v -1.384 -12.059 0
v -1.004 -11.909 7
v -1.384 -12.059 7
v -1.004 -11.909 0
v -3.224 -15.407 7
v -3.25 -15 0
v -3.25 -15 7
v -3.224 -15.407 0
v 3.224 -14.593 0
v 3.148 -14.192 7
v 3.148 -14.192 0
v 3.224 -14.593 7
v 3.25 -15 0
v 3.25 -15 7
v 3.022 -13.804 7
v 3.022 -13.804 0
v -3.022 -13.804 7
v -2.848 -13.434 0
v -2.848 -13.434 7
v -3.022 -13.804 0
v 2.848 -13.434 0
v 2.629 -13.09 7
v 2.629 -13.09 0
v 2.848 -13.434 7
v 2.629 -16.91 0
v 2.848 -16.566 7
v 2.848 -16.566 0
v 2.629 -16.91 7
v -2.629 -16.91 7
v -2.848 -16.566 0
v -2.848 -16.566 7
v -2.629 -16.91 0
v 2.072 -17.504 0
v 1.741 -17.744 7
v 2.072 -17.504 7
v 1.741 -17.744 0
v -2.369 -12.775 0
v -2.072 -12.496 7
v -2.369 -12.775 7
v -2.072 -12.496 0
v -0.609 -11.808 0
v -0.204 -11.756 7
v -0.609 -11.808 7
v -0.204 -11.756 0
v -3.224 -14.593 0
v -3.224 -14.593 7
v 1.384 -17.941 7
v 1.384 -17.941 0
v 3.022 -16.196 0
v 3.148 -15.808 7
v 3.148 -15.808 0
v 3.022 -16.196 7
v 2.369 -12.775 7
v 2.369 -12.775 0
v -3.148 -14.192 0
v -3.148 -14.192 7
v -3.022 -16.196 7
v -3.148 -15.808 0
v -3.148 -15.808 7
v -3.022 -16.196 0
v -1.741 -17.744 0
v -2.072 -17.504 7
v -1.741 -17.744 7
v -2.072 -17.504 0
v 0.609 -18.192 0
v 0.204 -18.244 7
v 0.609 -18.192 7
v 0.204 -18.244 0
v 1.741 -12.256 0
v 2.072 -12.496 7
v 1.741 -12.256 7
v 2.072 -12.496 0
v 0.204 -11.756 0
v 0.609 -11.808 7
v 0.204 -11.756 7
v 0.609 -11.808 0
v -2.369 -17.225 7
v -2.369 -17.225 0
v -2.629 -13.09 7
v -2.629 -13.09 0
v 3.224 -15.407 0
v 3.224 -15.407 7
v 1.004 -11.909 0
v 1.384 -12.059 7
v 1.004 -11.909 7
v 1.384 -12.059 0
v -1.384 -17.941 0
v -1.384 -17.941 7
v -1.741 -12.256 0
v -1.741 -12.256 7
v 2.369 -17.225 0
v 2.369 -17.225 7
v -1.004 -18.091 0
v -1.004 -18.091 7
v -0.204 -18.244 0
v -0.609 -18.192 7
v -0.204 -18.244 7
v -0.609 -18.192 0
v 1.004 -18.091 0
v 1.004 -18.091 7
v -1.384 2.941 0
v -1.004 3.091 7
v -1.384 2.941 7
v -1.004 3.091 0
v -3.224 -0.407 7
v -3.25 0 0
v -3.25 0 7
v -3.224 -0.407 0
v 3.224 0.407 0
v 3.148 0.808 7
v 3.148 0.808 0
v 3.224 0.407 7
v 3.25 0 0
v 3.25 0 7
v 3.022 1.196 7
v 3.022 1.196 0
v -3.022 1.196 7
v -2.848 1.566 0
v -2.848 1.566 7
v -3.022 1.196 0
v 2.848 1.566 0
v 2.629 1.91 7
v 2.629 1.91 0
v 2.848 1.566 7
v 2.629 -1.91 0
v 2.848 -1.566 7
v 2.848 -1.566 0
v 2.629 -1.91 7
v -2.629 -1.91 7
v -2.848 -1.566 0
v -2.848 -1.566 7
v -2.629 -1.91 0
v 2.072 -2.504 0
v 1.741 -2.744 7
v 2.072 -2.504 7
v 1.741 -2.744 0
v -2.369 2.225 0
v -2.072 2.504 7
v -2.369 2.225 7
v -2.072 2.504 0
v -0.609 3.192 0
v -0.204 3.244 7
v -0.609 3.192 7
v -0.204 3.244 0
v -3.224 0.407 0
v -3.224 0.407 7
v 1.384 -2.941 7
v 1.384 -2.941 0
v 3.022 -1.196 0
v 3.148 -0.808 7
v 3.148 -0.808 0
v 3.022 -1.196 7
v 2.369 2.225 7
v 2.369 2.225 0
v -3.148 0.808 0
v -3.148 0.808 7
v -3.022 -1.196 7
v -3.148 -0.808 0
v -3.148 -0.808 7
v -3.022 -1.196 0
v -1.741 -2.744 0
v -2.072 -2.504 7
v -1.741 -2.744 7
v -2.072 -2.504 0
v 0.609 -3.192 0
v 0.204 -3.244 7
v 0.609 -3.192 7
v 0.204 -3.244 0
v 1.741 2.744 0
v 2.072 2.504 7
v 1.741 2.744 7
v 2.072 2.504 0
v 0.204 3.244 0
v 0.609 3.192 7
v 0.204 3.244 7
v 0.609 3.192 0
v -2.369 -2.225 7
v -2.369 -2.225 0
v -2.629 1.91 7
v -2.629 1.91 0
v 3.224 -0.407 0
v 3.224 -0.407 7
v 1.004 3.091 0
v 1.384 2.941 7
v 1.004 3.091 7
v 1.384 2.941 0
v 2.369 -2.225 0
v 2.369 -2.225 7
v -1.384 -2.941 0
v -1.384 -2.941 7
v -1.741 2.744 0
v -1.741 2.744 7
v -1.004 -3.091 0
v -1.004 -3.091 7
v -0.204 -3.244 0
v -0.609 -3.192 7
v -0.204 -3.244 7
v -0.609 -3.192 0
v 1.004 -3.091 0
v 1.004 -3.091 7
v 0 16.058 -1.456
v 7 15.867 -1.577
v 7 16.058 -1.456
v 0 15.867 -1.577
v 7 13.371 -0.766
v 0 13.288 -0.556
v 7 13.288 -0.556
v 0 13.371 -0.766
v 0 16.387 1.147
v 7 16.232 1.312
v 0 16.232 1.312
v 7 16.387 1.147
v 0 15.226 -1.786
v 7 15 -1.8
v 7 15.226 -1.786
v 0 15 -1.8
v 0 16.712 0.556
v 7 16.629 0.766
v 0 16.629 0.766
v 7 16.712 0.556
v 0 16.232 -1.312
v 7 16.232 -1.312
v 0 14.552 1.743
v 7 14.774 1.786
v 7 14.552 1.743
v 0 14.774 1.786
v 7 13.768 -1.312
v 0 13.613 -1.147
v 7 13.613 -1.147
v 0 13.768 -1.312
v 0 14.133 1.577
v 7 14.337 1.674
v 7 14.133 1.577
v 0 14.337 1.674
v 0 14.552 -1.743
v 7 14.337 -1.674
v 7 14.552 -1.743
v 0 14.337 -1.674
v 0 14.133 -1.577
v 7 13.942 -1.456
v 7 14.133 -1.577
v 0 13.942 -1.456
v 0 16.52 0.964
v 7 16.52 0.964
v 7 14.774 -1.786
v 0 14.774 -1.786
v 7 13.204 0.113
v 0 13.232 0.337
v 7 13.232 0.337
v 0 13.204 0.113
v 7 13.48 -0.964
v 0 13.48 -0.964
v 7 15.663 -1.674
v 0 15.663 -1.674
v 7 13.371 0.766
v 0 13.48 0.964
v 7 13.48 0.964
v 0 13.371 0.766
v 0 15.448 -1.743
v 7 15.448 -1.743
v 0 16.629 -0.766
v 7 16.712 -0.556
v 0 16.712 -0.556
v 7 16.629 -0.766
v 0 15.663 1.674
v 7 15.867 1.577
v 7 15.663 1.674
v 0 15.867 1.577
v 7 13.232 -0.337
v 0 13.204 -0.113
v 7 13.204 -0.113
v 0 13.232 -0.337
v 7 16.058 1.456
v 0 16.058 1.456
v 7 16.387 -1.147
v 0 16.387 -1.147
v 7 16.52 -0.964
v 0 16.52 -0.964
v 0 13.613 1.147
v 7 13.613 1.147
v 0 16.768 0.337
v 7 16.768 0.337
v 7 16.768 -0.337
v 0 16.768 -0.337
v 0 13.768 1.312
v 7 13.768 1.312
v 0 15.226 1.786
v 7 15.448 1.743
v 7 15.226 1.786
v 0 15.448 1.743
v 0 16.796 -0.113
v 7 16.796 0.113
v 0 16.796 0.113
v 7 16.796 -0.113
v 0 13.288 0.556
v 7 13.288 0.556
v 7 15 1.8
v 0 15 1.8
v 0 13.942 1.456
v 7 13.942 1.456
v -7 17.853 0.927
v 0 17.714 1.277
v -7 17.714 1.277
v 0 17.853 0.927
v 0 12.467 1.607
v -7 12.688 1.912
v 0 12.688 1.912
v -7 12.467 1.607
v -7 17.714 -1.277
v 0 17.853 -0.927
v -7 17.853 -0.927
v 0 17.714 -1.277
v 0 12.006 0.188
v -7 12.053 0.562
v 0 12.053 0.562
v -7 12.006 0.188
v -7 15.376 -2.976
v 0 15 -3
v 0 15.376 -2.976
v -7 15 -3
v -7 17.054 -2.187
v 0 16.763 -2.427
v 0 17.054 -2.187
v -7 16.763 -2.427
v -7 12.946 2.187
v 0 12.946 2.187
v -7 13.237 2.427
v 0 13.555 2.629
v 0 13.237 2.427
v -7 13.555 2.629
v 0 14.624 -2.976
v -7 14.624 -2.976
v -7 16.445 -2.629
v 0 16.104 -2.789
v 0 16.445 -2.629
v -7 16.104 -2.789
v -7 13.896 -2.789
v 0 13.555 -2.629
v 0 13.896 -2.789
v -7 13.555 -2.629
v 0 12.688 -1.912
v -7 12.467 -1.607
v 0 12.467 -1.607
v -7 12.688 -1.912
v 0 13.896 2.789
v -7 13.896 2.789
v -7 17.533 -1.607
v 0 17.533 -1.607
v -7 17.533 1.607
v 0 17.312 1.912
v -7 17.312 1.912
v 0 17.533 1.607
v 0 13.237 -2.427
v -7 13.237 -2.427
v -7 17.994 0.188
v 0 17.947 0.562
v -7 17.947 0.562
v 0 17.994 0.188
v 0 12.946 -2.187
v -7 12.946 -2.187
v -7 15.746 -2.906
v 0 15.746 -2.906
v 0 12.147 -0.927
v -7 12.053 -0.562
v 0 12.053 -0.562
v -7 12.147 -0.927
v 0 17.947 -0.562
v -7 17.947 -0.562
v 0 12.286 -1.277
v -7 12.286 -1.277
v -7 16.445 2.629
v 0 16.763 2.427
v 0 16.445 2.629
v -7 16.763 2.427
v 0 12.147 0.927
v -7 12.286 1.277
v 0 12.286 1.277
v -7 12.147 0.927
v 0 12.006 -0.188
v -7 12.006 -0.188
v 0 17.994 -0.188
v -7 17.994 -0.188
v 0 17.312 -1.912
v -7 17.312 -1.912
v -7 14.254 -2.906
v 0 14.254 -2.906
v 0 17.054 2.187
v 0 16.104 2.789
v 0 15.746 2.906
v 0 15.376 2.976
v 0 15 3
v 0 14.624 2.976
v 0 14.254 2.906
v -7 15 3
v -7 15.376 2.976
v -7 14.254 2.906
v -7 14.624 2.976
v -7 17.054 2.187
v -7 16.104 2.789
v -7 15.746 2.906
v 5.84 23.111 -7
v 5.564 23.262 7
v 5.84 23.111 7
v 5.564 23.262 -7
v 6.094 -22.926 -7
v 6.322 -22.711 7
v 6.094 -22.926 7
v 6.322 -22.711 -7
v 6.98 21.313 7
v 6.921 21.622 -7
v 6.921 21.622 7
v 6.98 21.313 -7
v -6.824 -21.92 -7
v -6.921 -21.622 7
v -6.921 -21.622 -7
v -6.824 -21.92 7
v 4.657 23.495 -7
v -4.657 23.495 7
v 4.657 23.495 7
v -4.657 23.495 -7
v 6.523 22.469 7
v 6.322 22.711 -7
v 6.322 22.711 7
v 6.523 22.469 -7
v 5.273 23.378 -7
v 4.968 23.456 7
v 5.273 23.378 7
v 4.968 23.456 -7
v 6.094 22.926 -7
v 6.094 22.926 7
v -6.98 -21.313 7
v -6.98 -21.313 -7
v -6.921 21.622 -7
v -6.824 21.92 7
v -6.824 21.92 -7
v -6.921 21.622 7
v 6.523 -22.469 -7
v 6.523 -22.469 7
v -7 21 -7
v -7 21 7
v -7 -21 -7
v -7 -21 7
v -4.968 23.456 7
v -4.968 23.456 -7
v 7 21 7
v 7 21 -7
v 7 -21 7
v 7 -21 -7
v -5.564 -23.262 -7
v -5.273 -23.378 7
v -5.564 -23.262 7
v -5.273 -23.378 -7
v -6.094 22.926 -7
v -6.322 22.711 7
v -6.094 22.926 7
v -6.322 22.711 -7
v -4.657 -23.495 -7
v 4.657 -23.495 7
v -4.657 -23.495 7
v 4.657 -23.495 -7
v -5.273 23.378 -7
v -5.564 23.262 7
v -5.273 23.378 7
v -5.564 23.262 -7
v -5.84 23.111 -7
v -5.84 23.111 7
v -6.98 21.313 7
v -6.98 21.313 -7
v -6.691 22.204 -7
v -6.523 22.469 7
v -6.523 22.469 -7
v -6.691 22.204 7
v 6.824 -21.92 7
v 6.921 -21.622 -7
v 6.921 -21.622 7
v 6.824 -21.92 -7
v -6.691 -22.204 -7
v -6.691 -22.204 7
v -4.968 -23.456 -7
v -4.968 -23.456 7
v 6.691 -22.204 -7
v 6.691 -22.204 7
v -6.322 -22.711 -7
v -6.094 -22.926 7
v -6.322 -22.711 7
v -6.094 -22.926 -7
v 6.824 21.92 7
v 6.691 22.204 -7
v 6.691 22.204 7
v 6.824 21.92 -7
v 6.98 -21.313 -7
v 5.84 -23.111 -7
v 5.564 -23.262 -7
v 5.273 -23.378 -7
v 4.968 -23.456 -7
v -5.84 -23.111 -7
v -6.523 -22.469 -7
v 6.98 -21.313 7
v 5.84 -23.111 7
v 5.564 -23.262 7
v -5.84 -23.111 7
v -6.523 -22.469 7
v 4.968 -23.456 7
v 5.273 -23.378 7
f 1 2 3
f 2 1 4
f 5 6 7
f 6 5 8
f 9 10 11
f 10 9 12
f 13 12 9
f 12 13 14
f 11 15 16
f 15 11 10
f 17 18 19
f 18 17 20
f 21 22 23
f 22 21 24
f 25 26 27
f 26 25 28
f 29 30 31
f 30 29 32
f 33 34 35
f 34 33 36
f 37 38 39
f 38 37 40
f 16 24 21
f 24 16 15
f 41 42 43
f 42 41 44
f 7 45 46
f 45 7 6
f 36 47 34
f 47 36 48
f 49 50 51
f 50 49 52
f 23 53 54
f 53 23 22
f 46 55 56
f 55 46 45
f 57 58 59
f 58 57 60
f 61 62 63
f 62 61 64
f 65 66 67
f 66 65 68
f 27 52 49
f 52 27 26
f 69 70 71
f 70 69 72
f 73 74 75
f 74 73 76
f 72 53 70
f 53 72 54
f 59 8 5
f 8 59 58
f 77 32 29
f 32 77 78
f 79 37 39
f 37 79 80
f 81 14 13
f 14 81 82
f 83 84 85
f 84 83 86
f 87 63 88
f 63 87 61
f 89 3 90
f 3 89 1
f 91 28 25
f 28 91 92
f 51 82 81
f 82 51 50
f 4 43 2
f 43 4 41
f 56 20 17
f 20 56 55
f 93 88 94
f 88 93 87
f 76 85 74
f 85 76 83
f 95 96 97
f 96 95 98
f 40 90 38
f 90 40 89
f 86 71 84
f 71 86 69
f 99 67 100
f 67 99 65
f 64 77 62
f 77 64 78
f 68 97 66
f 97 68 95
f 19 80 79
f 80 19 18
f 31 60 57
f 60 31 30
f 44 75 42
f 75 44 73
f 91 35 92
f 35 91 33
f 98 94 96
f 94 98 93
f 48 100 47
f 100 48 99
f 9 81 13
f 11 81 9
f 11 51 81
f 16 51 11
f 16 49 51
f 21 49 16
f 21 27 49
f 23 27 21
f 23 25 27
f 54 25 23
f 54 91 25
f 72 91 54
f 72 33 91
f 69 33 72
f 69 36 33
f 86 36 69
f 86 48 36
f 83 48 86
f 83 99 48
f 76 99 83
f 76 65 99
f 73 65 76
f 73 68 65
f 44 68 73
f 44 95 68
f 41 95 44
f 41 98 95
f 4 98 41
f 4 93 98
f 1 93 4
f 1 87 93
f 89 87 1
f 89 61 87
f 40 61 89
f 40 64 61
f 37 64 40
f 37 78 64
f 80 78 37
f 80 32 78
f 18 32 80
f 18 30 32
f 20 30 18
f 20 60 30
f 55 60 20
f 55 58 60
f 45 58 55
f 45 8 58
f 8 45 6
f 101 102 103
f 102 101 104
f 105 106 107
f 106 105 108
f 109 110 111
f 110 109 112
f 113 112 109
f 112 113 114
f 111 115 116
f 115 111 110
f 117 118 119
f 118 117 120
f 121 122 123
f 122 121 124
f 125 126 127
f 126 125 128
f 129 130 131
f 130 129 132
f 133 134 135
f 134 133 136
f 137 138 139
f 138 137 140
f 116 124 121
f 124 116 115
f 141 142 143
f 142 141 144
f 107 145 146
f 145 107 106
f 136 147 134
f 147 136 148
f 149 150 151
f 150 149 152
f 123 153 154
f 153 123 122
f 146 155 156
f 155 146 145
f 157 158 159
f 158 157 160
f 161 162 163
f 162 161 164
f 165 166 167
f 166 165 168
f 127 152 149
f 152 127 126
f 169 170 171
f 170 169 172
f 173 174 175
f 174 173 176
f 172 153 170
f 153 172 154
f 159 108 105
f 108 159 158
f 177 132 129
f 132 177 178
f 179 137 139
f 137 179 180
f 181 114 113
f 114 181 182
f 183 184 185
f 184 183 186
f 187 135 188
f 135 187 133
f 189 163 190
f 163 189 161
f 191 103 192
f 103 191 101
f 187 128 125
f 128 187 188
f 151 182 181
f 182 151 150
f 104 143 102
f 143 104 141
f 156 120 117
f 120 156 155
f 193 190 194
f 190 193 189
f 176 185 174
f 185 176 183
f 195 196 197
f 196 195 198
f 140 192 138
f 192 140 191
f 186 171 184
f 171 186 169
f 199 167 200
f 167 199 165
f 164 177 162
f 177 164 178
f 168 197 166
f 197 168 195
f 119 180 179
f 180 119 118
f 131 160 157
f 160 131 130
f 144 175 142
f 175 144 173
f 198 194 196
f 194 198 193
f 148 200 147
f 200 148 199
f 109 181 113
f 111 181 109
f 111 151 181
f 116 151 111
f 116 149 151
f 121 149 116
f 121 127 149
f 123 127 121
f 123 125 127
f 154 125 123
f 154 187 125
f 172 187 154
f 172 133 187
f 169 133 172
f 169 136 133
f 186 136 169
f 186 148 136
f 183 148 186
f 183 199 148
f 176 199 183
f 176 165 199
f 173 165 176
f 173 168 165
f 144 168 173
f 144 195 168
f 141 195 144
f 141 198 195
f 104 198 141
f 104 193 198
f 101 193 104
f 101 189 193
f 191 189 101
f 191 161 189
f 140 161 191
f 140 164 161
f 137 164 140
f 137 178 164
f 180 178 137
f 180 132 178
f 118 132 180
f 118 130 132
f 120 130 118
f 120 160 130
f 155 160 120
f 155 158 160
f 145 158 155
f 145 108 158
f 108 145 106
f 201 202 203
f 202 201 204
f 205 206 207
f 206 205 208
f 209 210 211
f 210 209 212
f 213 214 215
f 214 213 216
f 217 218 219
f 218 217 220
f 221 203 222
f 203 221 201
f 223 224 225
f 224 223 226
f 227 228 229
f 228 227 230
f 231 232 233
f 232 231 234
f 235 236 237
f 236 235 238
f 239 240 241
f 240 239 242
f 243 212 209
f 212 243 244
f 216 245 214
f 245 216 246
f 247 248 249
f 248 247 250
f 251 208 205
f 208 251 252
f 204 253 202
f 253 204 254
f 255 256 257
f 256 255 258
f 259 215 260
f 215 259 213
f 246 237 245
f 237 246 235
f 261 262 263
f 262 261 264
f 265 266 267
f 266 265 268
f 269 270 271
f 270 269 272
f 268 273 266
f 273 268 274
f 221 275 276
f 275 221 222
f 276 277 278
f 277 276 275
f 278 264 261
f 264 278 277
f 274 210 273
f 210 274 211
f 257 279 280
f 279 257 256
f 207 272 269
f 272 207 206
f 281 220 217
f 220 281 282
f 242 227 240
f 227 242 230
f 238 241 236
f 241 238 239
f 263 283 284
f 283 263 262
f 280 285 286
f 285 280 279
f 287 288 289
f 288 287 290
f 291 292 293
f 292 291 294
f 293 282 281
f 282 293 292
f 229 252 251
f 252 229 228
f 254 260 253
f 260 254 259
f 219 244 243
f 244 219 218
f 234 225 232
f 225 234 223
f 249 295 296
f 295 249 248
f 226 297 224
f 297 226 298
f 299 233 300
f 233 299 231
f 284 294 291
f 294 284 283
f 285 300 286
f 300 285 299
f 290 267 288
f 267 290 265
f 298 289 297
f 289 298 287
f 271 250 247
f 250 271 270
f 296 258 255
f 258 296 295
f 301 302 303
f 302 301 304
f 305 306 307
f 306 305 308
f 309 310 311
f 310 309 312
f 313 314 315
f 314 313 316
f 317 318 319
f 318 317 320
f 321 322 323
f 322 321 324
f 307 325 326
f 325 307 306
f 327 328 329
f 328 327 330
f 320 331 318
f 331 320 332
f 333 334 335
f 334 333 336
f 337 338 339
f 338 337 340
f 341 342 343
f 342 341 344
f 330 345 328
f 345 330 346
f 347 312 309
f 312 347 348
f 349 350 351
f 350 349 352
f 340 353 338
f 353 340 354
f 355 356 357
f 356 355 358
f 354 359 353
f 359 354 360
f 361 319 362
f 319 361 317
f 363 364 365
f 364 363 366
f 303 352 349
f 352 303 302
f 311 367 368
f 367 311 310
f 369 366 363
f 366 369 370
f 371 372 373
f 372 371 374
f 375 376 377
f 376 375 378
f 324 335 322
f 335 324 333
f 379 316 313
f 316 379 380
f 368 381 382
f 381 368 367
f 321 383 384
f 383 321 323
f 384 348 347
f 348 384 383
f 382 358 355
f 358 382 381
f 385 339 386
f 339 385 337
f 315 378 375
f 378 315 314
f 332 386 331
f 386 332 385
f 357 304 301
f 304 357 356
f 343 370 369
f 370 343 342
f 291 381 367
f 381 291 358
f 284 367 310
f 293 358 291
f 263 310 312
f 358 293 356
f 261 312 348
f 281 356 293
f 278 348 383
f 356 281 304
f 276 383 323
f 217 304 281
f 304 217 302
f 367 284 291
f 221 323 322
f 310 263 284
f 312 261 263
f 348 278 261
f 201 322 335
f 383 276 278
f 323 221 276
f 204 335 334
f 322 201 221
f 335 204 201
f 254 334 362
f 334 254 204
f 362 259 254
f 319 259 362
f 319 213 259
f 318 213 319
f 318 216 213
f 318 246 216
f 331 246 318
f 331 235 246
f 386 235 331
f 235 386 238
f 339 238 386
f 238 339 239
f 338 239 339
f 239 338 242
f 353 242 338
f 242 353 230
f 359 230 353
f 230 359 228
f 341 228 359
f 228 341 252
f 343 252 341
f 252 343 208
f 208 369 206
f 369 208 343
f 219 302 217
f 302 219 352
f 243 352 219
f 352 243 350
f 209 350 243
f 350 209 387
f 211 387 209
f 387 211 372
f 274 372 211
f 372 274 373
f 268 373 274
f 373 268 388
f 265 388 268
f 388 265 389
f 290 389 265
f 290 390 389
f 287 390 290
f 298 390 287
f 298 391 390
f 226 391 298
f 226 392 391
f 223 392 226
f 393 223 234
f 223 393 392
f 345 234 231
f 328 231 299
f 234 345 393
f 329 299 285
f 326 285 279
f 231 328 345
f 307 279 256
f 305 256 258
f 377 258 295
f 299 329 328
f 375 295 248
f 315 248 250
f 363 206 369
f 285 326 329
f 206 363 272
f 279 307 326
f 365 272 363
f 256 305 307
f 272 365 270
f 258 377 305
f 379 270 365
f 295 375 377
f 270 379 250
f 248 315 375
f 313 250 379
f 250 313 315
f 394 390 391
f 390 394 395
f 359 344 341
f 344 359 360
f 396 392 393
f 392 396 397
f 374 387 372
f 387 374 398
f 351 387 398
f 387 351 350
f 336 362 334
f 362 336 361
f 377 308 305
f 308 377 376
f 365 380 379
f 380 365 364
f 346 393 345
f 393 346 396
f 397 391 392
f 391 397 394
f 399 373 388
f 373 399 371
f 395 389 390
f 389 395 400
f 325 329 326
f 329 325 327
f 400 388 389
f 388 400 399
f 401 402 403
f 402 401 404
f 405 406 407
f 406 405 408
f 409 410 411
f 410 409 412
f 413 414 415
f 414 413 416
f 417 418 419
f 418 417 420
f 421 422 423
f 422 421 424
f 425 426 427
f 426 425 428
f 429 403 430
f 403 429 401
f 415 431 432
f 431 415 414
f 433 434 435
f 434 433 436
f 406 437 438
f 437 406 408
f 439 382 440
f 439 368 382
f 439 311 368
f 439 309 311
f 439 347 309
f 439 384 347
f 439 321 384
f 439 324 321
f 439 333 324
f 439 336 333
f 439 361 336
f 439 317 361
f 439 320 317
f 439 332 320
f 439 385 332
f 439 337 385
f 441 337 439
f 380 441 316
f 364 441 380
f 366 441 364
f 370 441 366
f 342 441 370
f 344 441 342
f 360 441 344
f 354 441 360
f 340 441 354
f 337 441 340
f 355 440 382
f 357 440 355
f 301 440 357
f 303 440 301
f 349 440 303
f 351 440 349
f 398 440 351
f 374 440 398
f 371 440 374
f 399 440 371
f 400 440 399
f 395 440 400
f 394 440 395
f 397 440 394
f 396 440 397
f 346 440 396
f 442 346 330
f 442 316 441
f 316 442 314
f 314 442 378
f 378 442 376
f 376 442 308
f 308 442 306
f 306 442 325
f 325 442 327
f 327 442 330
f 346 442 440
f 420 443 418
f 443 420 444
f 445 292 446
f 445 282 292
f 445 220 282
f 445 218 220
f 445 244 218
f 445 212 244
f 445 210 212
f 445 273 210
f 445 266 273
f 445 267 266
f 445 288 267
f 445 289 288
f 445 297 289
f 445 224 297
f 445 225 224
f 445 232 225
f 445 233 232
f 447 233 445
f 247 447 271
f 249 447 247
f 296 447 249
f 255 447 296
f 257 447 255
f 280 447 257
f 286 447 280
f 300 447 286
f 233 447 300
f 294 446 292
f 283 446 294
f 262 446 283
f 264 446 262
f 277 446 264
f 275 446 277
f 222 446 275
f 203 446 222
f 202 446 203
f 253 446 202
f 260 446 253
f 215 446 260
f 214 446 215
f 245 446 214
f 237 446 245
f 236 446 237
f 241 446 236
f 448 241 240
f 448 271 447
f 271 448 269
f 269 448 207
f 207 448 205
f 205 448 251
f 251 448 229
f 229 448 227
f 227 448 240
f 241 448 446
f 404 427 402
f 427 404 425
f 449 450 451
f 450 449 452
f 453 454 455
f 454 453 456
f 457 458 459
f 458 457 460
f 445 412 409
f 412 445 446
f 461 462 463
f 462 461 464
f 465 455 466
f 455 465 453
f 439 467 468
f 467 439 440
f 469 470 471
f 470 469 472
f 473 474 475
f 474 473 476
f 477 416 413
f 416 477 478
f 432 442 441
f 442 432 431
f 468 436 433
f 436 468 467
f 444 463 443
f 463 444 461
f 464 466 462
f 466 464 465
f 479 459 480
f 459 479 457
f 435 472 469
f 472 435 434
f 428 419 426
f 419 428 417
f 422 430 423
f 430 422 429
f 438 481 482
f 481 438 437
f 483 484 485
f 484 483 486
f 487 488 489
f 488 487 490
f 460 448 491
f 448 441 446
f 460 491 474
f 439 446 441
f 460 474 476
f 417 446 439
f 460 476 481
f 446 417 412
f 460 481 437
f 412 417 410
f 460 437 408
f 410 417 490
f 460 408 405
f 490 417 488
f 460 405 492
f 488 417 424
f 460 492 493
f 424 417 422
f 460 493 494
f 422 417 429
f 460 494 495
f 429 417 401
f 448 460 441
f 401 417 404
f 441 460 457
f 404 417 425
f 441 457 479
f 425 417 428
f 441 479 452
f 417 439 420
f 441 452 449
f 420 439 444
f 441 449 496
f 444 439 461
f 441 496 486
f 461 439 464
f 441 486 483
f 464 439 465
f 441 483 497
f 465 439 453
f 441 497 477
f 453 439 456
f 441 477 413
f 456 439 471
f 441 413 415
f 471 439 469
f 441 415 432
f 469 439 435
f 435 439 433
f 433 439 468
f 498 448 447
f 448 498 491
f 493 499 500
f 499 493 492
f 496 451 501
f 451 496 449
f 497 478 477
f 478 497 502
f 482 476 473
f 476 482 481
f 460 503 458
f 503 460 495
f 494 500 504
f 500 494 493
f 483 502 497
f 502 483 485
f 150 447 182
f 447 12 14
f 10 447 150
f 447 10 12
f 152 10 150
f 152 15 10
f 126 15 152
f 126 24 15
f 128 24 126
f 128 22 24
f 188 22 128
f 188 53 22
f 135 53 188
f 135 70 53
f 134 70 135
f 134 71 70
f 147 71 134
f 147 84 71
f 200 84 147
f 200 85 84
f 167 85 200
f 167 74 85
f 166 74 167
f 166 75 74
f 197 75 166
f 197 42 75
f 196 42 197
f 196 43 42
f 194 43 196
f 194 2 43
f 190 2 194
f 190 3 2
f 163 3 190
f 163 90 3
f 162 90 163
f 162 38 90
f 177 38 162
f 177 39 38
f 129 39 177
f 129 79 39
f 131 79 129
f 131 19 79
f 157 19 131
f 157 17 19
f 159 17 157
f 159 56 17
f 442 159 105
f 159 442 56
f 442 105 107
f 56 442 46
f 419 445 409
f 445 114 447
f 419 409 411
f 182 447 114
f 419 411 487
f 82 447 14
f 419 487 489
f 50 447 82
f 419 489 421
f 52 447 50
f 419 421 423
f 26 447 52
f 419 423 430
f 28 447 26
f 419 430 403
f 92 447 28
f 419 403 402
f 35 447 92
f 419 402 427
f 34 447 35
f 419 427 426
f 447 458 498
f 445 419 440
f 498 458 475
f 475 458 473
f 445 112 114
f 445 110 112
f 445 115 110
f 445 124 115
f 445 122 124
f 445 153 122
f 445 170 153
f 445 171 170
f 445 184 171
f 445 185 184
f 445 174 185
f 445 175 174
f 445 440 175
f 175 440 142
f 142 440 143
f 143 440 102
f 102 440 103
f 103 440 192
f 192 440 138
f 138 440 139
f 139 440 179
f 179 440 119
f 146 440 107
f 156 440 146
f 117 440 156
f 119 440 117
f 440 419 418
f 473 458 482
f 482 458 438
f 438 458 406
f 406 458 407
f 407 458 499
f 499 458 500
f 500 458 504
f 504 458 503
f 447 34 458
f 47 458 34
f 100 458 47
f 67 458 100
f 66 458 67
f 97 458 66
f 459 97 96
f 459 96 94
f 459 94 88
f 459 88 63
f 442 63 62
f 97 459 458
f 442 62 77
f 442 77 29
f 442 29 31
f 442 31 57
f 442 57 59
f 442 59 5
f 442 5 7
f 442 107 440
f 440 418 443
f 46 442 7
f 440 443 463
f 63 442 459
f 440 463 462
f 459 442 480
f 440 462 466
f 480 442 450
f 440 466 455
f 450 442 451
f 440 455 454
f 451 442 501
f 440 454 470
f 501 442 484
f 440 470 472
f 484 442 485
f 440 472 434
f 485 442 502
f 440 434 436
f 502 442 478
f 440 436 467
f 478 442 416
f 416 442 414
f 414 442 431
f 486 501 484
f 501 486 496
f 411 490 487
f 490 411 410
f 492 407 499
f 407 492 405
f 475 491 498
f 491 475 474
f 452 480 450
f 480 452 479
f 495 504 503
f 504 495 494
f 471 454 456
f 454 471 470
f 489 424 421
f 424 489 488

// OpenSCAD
$fn = 50;


difference() {
	union() {
		translate(v = [0, 0, -7.0000000000]) {
			hull() {
				translate(v = [-4.5000000000, 21.0000000000, 0]) {
					cylinder(h = 14, r = 2.5000000000);
				}
				translate(v = [4.5000000000, 21.0000000000, 0]) {
					cylinder(h = 14, r = 2.5000000000);
				}
				translate(v = [-4.5000000000, -21.0000000000, 0]) {
					cylinder(h = 14, r = 2.5000000000);
				}
				translate(v = [4.5000000000, -21.0000000000, 0]) {
					cylinder(h = 14, r = 2.5000000000);
				}
			}
		}
	}
	union() {
		translate(v = [0.0000000000, -15.0000000000, 0]) {
			cylinder(h = 100, r = 3.2500000000);
		}
		cylinder(h = 100, r = 3.2500000000);
		translate(v = [-50, 15, 0]) {
			rotate(a = [0, 90, 0]) {
				cylinder(h = 100, r = 1.8000000000);
			}
		}
		translate(v = [-100, 15, 0]) {
			rotate(a = [0, 90, 0]) {
				cylinder(h = 100, r = 3.0000000000);
			}
		}
	}
}
